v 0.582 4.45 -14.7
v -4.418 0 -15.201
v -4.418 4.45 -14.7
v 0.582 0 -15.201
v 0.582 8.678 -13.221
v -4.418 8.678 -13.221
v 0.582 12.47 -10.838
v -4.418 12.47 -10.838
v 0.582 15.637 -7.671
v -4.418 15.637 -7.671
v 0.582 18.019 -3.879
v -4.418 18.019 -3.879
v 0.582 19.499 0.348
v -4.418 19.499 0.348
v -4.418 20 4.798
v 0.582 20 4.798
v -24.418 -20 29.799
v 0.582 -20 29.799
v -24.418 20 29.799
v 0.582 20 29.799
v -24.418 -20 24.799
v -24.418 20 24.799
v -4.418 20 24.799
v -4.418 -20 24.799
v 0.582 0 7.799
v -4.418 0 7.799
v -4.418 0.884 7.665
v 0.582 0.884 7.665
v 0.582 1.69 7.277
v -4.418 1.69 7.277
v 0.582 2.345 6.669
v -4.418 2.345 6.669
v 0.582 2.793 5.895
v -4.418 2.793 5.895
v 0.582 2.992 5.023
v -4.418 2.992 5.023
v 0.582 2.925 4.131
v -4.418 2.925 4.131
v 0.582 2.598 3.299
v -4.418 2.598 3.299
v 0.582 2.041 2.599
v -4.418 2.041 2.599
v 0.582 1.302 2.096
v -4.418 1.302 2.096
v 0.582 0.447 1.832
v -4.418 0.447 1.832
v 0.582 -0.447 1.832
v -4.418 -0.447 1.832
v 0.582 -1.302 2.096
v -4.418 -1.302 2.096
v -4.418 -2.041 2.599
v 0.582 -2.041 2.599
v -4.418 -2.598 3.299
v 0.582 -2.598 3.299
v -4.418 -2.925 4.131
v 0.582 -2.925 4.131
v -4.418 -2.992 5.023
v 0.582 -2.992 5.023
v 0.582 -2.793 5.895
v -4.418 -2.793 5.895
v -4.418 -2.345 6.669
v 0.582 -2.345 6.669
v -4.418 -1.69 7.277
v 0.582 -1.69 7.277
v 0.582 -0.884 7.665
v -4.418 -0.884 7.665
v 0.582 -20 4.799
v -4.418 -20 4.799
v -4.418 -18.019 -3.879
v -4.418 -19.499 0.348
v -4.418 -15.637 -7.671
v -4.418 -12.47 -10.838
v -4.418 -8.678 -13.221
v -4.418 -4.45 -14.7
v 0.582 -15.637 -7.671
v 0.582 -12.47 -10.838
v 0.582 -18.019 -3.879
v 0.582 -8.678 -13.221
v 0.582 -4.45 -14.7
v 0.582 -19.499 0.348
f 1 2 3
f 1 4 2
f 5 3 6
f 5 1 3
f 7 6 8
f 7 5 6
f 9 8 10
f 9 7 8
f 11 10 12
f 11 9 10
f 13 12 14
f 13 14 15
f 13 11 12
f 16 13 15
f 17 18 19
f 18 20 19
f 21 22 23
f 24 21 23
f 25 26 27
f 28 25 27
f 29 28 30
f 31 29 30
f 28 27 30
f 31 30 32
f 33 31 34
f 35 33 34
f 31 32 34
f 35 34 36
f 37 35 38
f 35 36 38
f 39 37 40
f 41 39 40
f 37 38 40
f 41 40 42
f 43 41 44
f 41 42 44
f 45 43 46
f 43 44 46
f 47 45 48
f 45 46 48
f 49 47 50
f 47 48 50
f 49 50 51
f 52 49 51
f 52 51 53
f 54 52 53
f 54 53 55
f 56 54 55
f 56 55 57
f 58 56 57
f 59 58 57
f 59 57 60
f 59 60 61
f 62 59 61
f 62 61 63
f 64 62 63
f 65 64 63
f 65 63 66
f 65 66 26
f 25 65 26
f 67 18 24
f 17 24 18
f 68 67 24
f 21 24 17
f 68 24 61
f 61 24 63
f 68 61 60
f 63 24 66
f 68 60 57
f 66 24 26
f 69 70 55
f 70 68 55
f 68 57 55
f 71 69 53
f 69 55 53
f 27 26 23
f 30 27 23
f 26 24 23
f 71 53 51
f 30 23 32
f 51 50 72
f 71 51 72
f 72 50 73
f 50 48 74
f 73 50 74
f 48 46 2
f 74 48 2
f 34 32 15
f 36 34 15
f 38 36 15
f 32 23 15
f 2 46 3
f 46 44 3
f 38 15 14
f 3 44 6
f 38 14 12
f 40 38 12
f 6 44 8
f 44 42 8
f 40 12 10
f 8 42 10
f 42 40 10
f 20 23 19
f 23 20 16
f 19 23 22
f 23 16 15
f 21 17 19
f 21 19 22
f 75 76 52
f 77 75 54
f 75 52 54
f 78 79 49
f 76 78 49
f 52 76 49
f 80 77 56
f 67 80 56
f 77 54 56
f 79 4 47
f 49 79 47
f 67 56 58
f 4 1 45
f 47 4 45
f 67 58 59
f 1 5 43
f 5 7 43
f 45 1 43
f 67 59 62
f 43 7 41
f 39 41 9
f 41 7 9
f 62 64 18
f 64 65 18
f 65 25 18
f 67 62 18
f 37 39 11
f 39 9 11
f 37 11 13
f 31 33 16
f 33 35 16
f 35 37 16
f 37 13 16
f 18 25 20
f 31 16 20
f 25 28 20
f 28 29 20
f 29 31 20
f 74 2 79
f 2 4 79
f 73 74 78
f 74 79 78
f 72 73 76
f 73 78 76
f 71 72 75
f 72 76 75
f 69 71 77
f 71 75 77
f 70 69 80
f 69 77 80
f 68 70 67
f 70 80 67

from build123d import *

# Parameters (mm, degrees)
BOSS_EXTRUDE1_DEPTH = 20
FILLET1_R           = 20
FILLET2_R           = 20
SKETCH2_R           = 3
CUT_EXTRUDE2_DEPTH  = 40


with BuildPart() as part:
    # Sketch1 → Boss-Extrude1 (new, symmetric)
    with BuildSketch(Plane(origin=(0, 0, 0), x_dir=(1, 0, 0), z_dir=(0, 1, 0))):
        Polygon((-4.418120101, 15.201487277), (0.581879899, 15.201487277), (0.581879899, -29.798512723), (-24.418120101, -29.798512723), (-24.418120101, -24.798512723), (-4.418120101, -24.798512723), align=None)
    extrude(amount=BOSS_EXTRUDE1_DEPTH, both=True)

    # Fillet1
    fillet1_edges = [part.edges().sort_by_distance(p)[0] for p in [
        (-1.918120101, -20, -15.201487277),
    ]]
    fillet(fillet1_edges, radius=FILLET1_R)

    # Fillet2
    fillet2_edges = [part.edges().sort_by_distance(p)[0] for p in [
        (-1.918120101, 20, -15.201487277),
    ]]
    fillet(fillet2_edges, radius=FILLET2_R - 0.0001)  # a hair under: the kernel refuses the full size

    # Sketch2 → Cut-Extrude2 (cut)
    with BuildSketch(Plane.ZY.offset(4.418120101)):
        with Locations((4.798512723, 0)):
            Circle(SKETCH2_R)
    extrude(amount=-CUT_EXTRUDE2_DEPTH, mode=Mode.SUBTRACT)


solid = part.part
